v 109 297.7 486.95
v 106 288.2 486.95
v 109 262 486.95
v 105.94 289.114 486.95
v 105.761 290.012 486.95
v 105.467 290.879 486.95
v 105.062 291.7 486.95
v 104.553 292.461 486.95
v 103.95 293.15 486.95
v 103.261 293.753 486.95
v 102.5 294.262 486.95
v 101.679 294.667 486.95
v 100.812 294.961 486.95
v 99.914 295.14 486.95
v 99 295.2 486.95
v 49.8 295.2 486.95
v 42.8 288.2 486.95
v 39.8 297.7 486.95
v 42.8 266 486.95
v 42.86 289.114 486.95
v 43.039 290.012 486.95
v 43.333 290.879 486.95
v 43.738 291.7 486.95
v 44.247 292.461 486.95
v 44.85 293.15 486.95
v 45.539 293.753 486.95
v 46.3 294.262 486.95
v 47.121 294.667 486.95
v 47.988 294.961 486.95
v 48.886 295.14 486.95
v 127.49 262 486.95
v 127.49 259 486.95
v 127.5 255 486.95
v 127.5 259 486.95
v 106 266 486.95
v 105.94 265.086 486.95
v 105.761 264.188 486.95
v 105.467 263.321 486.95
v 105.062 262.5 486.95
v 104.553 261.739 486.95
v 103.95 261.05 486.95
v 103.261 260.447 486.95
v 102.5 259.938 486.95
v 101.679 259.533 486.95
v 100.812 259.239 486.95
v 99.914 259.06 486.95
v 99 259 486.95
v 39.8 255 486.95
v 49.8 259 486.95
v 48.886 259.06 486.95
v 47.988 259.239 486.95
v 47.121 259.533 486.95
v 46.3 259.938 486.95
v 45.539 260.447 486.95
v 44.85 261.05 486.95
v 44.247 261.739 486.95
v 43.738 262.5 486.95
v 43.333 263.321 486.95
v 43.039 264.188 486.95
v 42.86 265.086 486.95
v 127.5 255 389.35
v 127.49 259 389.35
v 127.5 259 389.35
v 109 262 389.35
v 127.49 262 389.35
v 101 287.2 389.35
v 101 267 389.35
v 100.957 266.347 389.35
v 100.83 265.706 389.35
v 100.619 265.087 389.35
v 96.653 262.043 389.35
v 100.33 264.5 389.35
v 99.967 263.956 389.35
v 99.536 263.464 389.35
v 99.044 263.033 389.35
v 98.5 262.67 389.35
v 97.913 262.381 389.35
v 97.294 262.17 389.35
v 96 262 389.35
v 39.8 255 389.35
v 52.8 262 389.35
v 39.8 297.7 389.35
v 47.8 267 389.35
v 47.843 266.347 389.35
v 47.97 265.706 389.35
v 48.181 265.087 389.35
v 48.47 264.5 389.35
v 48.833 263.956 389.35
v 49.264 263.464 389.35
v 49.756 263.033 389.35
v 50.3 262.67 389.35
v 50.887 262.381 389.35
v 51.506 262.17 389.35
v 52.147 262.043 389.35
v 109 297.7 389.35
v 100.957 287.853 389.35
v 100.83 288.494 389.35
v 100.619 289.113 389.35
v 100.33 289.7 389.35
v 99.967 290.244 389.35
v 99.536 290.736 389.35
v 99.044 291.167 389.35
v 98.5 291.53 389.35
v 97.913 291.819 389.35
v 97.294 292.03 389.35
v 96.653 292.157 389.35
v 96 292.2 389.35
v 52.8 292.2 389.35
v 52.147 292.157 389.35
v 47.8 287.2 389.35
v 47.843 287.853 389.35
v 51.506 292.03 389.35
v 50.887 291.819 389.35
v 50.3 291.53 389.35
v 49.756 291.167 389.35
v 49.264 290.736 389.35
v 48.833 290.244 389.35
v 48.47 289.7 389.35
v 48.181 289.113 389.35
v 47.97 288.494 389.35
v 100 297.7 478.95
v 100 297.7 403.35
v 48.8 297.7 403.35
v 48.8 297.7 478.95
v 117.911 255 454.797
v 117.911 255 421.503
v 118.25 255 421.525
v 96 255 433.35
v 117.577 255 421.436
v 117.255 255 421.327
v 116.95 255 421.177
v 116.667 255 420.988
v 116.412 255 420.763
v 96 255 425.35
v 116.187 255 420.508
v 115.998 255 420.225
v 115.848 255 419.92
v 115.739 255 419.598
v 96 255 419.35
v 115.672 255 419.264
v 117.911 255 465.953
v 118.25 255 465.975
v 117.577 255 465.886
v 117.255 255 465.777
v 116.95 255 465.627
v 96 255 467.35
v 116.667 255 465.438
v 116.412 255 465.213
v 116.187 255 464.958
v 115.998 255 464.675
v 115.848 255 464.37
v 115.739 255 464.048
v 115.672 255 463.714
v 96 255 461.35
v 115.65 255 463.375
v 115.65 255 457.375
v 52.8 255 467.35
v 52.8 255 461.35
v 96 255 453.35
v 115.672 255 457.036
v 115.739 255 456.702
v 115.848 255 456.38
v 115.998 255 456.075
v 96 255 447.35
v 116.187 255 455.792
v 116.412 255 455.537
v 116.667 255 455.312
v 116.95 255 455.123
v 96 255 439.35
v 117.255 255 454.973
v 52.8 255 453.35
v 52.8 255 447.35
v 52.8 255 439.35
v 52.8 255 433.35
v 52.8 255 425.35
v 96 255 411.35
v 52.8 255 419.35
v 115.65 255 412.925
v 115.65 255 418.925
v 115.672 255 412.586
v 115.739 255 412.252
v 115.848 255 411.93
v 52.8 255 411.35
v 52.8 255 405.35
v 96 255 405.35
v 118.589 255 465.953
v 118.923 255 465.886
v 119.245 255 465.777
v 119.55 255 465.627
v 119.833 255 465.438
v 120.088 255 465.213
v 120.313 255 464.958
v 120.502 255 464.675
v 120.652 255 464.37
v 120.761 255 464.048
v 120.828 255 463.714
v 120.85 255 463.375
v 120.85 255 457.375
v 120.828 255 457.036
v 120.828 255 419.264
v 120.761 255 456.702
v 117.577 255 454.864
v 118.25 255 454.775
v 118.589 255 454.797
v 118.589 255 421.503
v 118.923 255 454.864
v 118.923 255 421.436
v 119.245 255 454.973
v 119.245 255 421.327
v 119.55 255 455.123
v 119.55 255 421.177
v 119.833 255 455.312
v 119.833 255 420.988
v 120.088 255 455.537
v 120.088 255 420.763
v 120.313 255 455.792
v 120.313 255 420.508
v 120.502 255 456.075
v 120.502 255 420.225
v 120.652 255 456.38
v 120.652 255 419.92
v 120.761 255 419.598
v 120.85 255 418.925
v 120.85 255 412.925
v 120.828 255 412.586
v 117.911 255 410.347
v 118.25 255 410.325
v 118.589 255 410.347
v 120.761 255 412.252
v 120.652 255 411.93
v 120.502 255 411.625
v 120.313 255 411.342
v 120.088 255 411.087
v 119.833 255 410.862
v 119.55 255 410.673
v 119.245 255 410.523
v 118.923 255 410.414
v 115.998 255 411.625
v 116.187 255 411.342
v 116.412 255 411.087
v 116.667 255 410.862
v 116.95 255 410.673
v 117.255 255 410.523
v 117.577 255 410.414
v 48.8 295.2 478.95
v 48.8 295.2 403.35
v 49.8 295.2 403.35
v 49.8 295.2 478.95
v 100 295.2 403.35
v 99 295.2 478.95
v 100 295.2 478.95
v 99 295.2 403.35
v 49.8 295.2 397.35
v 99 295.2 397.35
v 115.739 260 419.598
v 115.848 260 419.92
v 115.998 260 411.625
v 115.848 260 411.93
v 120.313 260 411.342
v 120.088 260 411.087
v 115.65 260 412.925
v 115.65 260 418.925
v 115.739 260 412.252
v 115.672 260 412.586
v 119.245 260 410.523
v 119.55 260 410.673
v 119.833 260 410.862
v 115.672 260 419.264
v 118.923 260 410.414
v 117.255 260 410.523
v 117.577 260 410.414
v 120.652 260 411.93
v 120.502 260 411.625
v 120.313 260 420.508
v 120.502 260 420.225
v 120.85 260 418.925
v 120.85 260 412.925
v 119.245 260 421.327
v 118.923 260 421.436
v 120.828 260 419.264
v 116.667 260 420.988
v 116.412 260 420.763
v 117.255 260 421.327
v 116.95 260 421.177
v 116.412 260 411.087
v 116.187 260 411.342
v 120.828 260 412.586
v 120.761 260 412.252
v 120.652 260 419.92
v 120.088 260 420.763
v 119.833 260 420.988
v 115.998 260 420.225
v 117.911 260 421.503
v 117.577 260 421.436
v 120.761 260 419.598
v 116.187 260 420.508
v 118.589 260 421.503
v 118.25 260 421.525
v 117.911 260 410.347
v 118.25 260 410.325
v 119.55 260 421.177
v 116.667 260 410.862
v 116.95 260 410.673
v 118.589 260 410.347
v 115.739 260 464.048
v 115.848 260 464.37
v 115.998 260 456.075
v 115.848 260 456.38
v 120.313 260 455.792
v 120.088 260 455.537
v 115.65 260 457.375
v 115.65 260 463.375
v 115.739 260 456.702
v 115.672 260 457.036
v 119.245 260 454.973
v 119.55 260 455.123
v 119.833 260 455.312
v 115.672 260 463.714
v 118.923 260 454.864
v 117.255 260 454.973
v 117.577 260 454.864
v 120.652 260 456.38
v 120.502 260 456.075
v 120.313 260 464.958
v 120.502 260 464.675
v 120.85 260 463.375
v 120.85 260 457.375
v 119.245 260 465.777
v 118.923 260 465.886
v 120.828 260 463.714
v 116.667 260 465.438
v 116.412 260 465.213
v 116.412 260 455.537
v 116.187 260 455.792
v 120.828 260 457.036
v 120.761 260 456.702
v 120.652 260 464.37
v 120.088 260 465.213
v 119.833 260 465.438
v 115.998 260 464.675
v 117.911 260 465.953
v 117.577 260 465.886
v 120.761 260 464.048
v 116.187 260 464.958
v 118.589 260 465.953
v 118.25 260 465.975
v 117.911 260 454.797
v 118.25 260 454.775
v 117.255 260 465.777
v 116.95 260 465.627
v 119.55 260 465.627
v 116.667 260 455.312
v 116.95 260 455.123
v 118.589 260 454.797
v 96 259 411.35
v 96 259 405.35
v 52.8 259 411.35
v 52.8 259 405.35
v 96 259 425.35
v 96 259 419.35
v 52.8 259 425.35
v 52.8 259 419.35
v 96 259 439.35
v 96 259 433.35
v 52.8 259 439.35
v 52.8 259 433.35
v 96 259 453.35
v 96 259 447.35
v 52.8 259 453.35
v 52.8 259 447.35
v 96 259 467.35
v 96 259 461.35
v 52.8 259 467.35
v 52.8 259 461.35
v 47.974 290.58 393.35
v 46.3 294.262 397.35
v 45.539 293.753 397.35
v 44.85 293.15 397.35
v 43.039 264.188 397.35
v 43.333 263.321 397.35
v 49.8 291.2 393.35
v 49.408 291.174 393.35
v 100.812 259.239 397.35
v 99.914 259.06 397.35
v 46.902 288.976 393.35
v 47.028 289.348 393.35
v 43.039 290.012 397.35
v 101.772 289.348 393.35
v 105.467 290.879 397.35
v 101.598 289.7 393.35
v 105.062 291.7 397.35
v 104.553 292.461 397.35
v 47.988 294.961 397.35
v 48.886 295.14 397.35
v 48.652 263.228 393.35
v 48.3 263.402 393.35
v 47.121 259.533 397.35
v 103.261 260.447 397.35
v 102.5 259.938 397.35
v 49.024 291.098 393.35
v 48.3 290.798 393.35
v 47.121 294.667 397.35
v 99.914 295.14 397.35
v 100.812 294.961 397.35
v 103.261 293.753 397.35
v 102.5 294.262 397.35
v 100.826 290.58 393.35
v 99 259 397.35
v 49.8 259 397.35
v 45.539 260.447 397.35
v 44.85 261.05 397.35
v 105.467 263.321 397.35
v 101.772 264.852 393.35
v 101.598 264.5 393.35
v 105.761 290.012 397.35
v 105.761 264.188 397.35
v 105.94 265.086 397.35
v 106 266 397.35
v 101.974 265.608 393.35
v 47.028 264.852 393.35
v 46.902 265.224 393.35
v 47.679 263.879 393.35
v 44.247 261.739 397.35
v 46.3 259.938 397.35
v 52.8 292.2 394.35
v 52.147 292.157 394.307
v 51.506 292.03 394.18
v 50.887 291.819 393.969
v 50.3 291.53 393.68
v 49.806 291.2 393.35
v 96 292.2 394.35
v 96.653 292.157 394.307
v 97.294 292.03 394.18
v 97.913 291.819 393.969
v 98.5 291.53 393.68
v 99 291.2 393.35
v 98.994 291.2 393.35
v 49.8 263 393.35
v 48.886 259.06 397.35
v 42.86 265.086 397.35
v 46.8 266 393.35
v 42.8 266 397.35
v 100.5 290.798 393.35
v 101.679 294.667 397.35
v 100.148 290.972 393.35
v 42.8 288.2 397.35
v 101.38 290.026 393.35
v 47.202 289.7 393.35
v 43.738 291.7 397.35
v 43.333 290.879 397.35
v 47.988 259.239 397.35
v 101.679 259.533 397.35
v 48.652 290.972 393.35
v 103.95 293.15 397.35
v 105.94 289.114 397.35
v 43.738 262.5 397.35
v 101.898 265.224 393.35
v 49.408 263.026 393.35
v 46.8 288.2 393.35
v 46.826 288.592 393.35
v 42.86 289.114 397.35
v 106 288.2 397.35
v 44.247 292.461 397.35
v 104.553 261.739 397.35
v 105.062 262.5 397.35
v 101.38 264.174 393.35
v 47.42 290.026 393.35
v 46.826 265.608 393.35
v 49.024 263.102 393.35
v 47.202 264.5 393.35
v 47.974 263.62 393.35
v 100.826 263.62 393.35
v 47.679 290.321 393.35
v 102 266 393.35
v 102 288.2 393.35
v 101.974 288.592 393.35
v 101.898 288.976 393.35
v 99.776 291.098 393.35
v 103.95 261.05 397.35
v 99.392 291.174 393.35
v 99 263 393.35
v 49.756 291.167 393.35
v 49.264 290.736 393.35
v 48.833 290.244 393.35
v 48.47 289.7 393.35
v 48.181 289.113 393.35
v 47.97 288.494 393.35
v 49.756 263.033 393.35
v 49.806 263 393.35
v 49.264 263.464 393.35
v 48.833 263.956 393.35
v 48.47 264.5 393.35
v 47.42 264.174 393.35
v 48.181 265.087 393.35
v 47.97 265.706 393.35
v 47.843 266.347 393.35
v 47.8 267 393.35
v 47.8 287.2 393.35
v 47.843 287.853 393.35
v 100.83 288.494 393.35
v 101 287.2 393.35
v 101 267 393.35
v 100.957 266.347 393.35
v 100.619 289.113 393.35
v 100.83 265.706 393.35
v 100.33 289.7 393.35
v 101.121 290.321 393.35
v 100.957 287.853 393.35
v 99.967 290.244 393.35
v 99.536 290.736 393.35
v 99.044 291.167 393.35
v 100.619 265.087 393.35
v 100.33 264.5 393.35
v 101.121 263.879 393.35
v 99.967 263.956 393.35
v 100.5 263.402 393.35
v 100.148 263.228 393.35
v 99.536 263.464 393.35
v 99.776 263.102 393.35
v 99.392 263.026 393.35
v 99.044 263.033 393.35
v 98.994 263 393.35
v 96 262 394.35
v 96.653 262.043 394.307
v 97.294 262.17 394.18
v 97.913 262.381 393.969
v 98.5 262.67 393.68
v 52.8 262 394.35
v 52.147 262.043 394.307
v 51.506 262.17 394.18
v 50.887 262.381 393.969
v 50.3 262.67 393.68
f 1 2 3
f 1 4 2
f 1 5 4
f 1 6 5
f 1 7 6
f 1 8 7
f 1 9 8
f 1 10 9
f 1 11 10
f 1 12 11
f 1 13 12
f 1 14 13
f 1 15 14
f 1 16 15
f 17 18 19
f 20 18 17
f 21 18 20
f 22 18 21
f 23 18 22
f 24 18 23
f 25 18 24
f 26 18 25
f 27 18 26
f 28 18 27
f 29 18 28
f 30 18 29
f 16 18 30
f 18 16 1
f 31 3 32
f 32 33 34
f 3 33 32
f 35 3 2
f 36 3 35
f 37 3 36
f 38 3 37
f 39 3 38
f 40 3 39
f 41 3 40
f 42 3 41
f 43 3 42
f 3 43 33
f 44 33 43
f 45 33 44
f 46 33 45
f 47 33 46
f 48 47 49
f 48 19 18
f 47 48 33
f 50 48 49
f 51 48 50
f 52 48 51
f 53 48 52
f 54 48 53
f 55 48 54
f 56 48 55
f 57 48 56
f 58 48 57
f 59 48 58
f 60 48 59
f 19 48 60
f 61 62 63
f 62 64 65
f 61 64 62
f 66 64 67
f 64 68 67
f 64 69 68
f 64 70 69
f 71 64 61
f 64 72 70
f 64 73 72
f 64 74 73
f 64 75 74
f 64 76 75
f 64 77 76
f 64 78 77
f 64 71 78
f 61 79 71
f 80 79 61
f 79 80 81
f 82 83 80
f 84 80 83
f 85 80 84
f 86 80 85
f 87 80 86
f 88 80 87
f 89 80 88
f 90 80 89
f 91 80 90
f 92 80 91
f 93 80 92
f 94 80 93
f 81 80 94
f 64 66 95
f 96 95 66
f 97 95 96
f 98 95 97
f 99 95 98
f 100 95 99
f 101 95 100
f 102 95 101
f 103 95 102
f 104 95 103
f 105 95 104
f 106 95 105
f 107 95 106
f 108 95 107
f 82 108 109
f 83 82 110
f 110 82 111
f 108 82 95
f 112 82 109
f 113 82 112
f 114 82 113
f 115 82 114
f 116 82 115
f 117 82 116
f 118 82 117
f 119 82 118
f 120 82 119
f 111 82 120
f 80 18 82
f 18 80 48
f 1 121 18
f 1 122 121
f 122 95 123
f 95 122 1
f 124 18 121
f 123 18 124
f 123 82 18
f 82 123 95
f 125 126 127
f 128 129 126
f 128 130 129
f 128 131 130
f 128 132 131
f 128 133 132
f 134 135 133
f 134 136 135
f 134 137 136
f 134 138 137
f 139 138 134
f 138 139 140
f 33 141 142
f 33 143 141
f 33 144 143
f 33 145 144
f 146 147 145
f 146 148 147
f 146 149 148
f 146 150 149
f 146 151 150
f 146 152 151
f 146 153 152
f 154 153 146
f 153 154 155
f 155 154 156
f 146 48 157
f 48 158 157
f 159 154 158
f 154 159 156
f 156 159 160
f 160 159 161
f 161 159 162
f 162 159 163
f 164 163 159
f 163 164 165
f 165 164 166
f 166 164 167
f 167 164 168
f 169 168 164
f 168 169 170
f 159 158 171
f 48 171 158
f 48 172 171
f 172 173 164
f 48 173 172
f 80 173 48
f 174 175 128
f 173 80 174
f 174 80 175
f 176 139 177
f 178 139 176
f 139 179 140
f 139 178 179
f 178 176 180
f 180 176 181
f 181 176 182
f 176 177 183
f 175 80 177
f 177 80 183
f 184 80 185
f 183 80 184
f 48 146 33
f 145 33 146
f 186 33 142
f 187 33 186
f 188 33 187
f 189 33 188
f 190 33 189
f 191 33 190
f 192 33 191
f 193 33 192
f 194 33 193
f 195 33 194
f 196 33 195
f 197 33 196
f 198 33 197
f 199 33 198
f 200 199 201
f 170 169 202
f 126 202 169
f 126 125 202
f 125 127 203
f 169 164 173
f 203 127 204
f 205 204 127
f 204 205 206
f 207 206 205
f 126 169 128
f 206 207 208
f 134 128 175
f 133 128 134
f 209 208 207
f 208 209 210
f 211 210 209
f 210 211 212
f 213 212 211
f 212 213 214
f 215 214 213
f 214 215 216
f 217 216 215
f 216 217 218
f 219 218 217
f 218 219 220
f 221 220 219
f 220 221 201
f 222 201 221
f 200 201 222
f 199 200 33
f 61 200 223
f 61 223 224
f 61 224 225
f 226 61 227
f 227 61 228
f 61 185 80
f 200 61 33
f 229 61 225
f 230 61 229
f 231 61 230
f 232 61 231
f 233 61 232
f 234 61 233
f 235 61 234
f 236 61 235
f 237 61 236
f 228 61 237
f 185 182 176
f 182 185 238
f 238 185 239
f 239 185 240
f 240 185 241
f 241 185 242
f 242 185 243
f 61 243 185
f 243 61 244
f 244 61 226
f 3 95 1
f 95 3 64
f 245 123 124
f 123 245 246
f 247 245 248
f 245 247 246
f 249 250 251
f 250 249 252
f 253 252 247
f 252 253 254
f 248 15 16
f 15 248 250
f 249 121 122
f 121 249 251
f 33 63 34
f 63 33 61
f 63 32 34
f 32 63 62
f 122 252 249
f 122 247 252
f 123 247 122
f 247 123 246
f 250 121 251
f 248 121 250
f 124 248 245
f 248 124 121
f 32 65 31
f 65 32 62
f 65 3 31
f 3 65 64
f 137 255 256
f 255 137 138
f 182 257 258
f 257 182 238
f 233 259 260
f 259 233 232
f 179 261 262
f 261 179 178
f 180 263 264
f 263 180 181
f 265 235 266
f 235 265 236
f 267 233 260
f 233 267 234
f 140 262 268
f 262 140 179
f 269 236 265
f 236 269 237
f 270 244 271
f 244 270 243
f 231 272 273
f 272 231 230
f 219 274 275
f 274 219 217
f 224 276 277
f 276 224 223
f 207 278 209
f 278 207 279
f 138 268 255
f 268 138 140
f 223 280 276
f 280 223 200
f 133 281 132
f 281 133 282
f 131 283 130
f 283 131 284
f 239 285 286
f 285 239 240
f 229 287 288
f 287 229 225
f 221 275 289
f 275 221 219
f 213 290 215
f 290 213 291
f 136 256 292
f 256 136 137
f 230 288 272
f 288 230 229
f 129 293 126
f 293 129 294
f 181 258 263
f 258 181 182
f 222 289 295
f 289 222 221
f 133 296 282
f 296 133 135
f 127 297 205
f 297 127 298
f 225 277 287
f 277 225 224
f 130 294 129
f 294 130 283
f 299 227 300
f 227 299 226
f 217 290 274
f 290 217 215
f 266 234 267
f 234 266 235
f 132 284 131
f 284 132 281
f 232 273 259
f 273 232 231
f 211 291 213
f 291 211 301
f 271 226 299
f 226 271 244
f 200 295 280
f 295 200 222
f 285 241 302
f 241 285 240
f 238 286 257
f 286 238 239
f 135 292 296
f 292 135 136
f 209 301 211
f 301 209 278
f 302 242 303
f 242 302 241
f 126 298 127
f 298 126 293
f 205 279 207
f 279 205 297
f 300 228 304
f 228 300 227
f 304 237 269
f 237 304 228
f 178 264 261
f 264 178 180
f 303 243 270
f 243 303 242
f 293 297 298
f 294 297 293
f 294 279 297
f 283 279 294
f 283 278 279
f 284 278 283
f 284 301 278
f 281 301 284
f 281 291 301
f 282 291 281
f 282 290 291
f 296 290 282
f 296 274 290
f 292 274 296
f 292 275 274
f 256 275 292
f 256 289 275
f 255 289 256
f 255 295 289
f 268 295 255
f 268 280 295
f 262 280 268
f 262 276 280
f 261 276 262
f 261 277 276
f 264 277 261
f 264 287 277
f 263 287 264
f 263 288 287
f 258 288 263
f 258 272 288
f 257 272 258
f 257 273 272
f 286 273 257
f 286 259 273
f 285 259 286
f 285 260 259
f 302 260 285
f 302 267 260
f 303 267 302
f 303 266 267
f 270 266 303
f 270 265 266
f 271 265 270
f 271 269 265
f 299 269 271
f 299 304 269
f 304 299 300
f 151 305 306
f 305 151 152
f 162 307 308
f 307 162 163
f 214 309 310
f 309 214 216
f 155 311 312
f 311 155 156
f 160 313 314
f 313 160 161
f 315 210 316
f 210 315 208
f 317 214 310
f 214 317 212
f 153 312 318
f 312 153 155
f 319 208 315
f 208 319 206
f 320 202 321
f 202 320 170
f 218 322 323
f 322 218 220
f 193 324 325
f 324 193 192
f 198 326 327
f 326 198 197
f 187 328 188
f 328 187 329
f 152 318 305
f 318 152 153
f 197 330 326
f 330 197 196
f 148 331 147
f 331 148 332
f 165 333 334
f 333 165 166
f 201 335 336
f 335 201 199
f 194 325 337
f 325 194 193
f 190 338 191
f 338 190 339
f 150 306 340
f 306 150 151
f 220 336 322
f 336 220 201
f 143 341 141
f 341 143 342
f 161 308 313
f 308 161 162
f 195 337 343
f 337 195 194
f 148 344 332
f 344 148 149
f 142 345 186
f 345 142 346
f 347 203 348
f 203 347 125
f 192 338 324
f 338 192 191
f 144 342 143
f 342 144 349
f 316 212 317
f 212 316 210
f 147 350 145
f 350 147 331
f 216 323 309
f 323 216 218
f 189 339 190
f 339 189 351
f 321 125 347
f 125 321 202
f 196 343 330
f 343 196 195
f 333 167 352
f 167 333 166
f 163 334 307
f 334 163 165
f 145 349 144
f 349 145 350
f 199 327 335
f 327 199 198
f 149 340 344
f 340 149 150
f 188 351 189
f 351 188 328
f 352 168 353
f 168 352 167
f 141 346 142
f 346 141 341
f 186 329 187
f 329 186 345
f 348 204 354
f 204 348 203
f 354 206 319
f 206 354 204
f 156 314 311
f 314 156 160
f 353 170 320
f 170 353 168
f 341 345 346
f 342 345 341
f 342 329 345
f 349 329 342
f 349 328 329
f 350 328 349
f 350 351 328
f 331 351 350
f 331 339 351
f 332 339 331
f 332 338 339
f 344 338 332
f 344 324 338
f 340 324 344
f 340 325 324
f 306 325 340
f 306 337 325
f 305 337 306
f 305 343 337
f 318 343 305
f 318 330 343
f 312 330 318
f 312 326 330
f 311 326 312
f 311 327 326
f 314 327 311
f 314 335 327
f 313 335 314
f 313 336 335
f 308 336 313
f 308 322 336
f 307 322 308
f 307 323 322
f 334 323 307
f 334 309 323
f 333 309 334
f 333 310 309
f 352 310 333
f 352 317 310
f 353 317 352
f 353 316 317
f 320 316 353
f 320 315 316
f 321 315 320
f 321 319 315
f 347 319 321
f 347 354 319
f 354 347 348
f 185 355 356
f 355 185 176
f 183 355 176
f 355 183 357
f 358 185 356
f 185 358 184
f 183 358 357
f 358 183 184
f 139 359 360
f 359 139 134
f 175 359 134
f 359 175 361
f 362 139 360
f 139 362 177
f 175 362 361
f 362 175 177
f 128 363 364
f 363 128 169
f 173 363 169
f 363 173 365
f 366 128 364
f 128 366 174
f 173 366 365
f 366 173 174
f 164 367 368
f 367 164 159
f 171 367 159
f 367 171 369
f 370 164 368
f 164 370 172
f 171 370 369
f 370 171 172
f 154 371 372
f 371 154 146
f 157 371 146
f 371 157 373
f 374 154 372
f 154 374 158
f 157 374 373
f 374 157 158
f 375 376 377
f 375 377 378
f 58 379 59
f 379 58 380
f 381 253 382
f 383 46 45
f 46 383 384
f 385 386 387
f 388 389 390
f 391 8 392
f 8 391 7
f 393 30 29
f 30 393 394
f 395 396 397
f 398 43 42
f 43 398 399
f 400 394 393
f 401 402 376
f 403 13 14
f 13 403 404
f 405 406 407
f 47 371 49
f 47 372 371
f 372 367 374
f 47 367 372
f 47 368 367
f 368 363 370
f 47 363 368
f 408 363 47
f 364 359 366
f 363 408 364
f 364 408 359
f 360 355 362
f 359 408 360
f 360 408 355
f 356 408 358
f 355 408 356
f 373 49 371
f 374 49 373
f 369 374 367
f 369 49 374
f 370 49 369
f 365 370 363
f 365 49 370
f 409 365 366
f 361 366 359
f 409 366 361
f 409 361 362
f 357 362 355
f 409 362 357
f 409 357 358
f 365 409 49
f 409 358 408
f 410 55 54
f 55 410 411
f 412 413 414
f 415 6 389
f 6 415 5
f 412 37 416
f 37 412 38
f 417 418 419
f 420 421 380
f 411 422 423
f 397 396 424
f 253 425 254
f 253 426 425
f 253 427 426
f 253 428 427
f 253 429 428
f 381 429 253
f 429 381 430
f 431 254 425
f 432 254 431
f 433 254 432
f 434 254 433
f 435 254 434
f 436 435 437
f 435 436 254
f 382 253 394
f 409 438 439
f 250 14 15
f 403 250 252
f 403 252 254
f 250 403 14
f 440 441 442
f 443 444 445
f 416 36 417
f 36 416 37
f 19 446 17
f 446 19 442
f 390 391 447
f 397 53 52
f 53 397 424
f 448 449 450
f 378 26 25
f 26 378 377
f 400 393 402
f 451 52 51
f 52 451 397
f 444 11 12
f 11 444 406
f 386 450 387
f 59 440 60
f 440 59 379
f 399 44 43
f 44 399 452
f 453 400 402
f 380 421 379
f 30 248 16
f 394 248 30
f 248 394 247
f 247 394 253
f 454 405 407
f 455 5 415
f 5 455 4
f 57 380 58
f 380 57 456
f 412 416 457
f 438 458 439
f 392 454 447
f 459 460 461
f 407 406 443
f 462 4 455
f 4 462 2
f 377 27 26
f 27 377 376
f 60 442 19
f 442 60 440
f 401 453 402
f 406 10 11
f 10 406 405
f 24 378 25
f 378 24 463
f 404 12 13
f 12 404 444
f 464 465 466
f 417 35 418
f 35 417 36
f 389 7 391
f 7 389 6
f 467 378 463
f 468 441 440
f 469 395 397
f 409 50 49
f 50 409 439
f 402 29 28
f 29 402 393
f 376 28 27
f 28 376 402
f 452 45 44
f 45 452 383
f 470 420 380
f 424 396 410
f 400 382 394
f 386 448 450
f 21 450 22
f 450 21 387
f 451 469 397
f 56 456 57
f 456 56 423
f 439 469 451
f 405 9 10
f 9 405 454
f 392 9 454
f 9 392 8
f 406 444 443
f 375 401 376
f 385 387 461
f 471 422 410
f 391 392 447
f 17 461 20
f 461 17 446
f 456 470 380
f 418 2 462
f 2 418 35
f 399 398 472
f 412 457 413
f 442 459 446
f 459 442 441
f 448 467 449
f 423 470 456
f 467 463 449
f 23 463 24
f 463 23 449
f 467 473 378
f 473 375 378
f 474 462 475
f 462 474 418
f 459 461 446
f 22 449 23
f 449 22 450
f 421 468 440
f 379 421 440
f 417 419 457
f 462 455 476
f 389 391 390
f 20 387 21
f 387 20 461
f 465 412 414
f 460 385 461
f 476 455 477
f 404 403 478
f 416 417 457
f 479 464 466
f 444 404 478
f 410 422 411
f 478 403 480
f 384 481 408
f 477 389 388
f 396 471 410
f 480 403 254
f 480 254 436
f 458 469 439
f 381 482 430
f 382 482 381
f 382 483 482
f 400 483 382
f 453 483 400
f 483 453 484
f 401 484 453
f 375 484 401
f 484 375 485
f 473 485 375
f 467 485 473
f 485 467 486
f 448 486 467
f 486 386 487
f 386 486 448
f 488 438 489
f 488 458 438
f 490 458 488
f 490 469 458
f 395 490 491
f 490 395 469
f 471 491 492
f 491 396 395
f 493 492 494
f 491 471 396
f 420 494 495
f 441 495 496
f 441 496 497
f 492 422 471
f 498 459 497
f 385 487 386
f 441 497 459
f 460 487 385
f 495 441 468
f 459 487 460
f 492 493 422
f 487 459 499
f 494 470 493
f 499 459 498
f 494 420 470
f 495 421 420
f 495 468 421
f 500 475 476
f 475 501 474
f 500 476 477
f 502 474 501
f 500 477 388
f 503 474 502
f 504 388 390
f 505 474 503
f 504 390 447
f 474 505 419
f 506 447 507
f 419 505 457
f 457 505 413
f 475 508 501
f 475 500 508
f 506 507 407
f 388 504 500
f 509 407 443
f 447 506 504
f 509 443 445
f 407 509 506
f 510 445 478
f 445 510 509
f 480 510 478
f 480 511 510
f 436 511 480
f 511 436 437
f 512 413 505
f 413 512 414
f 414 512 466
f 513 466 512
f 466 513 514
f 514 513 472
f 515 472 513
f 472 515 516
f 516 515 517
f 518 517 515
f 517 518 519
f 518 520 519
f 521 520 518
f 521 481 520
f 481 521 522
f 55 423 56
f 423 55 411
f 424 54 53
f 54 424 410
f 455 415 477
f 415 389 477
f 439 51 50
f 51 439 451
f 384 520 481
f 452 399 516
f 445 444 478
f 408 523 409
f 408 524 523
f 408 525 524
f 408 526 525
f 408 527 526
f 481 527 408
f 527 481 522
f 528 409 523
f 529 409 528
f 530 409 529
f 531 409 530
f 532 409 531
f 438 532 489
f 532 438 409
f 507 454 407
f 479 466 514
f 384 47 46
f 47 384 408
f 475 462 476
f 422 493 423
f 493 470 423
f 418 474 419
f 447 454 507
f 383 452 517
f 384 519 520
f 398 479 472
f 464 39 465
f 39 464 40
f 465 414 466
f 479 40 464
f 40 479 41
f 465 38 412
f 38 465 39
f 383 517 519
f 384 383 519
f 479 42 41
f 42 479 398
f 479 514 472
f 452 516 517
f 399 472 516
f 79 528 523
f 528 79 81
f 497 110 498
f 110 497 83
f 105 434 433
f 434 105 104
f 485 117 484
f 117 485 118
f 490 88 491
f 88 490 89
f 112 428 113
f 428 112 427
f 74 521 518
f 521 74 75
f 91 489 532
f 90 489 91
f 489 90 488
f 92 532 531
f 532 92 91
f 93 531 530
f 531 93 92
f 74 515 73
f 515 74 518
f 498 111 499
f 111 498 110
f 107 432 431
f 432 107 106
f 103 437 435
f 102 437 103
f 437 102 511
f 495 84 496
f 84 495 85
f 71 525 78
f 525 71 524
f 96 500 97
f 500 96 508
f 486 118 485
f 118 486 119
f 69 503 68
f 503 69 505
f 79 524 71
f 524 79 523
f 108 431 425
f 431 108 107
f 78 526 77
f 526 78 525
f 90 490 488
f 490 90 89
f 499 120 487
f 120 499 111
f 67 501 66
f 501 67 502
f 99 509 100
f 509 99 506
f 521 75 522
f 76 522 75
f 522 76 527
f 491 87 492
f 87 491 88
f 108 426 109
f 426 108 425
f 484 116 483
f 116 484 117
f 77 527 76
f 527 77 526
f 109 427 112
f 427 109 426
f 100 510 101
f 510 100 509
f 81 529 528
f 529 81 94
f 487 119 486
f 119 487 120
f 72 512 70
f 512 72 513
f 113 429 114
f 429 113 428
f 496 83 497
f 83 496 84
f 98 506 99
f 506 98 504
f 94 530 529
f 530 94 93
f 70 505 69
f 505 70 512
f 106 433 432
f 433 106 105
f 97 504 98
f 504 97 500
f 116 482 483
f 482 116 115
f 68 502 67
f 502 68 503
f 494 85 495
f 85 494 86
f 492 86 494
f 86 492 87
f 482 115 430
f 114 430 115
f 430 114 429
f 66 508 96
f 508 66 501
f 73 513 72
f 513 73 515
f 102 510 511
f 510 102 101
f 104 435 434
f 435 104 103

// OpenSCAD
// file: ../injector_holster/injector_holster.scad
// =====================================================================
//  Vertical PoE injector holster for the rear rails of a 10" rack
//  (DeskPi RackMate T2). Holds a U-PoE-AT standing on end, ports up,
//  power socket down (or the reverse), hanging just outside the back
//  of the rack.
//
//  A flat plate bolts to the back (outside) face of a rear rail
//  with two rack screws, 1U apart. A sleeve on the plate holds the
//  injector with its broad face against the plate:
//    * side walls and front lips (like the Flex Mini mount's hoods)
//      stop it falling forward or sideways,
//    * a bottom shelf with a window for the C6 power plug carries it,
//    * the top is open for the RJ45 plugs.
//  Slide the injector in from the top, either end down: the shelf
//  window is wide enough for the power plug or the two RJ45 plugs. Left and right are mirror
//  images, so both sides of the rack can match.
//
//      the right-hand holster, seen from the sleeve side
//                 ports up
//              |  [====]  |  ||   <- rear rail
//              |  [    ]  |==o|      rack screw
//              |  [inj ]  |  ||
//              |  [    ]  |==o|      rack screw, 1U lower
//              |__[====]__|  ||
//                 power down
//
//  Coordinates: X = across the rack (+ towards the right rail),
//  Y = away from the rail, out the back of the rack (0 = rail's rear face), Z = up
//  (0 = bottom of the holster).
//  Parts: assembly | right | left
// =====================================================================

/* [View] */
part = "assembly";   // [assembly, right, left]
show_device = true;

/* [Injector] */
inj = [62, 35, 93];  // U-PoE-AT on end: width (X), thickness (Y), length (Z)
clear = 0.6;

/* [Rail] */
U = 44.45;
hole_inset = 9.25;     // rail hole centre in from the plate's outer edge
screw_d = 5.2;         // 10-32 / M5 clearance (M6: 6.6)
slot_len = 6;          // vertical slots, so the plate lines up with any hole pair
hole_gap_u = 1;        // screws this many U apart (same hole in each U, so any pair works)

/* [Holster] */
plate_t = 4;
wall = 3;
lip = 6;               // front lips overlap the injector face this much
lip_t = 2.5;
shelf_t = 4;
top_lip_h = 8;         // short lips at the top too, so it can't tip out
corner_r = 7;          // vertical corners of the cavity, following the injector's rounded edges
bottom_ch = 4;         // 45-degree chamfer where the shelf meets the walls, cups the rounded bottom edges
win_r = 5;             // rounded corners on the shelf window
ledge = 5;             // shelf ledge the injector rests on, each side
power_win = [inj[0] + 2 * clear - 2 * ledge, inj[1] + 2 * clear - 6];  // shelf window: wide enough for either end, so it can go in ports-down too

$fn = 48;

cav = [inj[0] + 2 * clear, inj[1] + 2 * clear, inj[2] + clear];
// plate: covers the sleeve plus a strip over the rail with the screw slots
strip_w = 2 * hole_inset;
plate_w = wall + cav[0] + wall + strip_w;
plate_h = shelf_t + cav[2];
hole_z0 = plate_h / 2 - hole_gap_u * U / 2;   // the two screws, centred
echo(str("Holster ", plate_w, " W x ", plate_t + cav[1] + lip_t, " D x ", plate_h,
         " H mm; screws ", hole_gap_u * U, " mm apart"));

module rrect(w, d, r, h) {
    hull() for (x = [r, w - r], y = [r, d - r]) translate([x, y, 0]) cylinder(r = r, h = h);
}

module slot(x, z) {
    translate([x, plate_t + 1, z]) rotate([90, 0, 0])
        hull() for (dz = [-slot_len / 2, slot_len / 2]) translate([0, dz, 0]) cylinder(d = screw_d, h = plate_t + 2);
}

// right-hand holster: rail strip on the +X side
module holster_right() {
    x_cav = wall;                          // cavity starts after the left wall
    x_strip = wall + cav[0] + wall;        // rail strip
    difference() {
        union() {
            // back plate against the rail face
            cube([plate_w, plate_t, plate_h]);
            // side walls
            for (x = [0, wall + cav[0]])
                translate([x, 0, 0]) cube([wall, plate_t + cav[1] + lip_t, plate_h]);
            // fill the sleeve; the rounded cavity is cut back out, leaving corner fillets
            translate([wall, plate_t, 0]) cube([cav[0], cav[1], plate_h]);
            // bottom shelf
            cube([wall + cav[0] + wall, plate_t + cav[1] + lip_t, shelf_t]);
            // full-height front lips down both sides
            for (x = [wall, wall + cav[0] - lip])
                translate([x, plate_t + cav[1], 0]) cube([lip, lip_t, plate_h]);
            // short lips across the bottom and top of the front face
            translate([wall, plate_t + cav[1], 0]) cube([cav[0], lip_t, shelf_t + 10]);
            translate([wall, plate_t + cav[1], plate_h - top_lip_h]) cube([cav[0], lip_t, top_lip_h]);
            // gusset tying the rail strip to the sleeve
            translate([x_strip - 0.01, 0, 0]) cube([strip_w, plate_t + 3, plate_h]);
        }
        // injector cavity: rounded vertical corners, chamfered into the shelf
        translate([x_cav, plate_t, 0]) hull() {
            translate([0, 0, shelf_t + bottom_ch]) rrect(cav[0], cav[1], corner_r, cav[2] + 1);
            translate([bottom_ch, bottom_ch, shelf_t]) rrect(cav[0] - 2 * bottom_ch, cav[1] - 2 * bottom_ch, max(corner_r - bottom_ch, 1), 0.01);
        }
        // shelf window with rounded corners, wide enough for the plugs at either end
        translate([x_cav + (cav[0] - power_win[0]) / 2, plate_t + (cav[1] - power_win[1]) / 2, -1])
            rrect(power_win[0], power_win[1], win_r, shelf_t + 2);
        // screw slots in the rail strip
        for (k = [0, 1]) slot(x_strip + strip_w / 2, hole_z0 + k * hole_gap_u * U);
        // vents in the back plate behind the injector
        for (z = [shelf_t + 12 : 14 : plate_h - 16])
            translate([x_cav + 10, -1, z]) cube([cav[0] - 20, plate_t + 2, 6]);
    }
}

module holster(side = "right") {
    if (side == "right") holster_right();
    else translate([plate_w, 0, 0]) mirror([1, 0, 0]) holster_right();
}

module injector(side = "right") {
    x = side == "right" ? wall + clear : strip_w + wall + clear;
    color("Gainsboro") translate([x, plate_t + clear, shelf_t]) cube(inj);
    // RJ45 ports on the top end
    color("#2b3036") for (dx = [inj[0] / 2 - 12, inj[0] / 2 + 12])
        translate([x + dx - 7, plate_t + clear + inj[1] / 2 - 6, shelf_t + inj[2] - 0.5]) cube([14, 12, 1]);
}

// print orientation: standing on the shelf as shown, no supports
// (only the top front lip bridges across)
if (part == "right") holster("right");
else if (part == "left") holster("left");
else {
    color("#2f3337") holster("right");
    if (show_device) injector("right");
    translate([-plate_w - 40, 0, 0]) {
        color("#2f3337") holster("left");
        if (show_device) injector("left");
    }
}
// main file
// Injector holsters on the rear rails, in rack coordinates.
// Bolted to the BACK face of the rear rails (y = 255 in the stand-in rack),
// hanging just outside the rack.
use <../injector_holster/injector_holster.scad>
which = "holster_r";
rail_y = 255;
rail_x = 118.25;
z0 = 11 * 44.45 - 97.6 - 2;   // one U down from the top, leaving room above for cables
// local strip centre: right holster 78.45, left 9.25 (see injector_holster.scad)
module place(side) {
    dx = side == "right" ? rail_x - 78.45 : -rail_x - 9.25;
    translate([dx, rail_y, z0]) children();
}
if (which == "holster_r") place("right") holster("right");
if (which == "holster_l") place("left") holster("left");
if (which == "inj_r") place("right") injector("right");
if (which == "inj_l") place("left") injector("left");
